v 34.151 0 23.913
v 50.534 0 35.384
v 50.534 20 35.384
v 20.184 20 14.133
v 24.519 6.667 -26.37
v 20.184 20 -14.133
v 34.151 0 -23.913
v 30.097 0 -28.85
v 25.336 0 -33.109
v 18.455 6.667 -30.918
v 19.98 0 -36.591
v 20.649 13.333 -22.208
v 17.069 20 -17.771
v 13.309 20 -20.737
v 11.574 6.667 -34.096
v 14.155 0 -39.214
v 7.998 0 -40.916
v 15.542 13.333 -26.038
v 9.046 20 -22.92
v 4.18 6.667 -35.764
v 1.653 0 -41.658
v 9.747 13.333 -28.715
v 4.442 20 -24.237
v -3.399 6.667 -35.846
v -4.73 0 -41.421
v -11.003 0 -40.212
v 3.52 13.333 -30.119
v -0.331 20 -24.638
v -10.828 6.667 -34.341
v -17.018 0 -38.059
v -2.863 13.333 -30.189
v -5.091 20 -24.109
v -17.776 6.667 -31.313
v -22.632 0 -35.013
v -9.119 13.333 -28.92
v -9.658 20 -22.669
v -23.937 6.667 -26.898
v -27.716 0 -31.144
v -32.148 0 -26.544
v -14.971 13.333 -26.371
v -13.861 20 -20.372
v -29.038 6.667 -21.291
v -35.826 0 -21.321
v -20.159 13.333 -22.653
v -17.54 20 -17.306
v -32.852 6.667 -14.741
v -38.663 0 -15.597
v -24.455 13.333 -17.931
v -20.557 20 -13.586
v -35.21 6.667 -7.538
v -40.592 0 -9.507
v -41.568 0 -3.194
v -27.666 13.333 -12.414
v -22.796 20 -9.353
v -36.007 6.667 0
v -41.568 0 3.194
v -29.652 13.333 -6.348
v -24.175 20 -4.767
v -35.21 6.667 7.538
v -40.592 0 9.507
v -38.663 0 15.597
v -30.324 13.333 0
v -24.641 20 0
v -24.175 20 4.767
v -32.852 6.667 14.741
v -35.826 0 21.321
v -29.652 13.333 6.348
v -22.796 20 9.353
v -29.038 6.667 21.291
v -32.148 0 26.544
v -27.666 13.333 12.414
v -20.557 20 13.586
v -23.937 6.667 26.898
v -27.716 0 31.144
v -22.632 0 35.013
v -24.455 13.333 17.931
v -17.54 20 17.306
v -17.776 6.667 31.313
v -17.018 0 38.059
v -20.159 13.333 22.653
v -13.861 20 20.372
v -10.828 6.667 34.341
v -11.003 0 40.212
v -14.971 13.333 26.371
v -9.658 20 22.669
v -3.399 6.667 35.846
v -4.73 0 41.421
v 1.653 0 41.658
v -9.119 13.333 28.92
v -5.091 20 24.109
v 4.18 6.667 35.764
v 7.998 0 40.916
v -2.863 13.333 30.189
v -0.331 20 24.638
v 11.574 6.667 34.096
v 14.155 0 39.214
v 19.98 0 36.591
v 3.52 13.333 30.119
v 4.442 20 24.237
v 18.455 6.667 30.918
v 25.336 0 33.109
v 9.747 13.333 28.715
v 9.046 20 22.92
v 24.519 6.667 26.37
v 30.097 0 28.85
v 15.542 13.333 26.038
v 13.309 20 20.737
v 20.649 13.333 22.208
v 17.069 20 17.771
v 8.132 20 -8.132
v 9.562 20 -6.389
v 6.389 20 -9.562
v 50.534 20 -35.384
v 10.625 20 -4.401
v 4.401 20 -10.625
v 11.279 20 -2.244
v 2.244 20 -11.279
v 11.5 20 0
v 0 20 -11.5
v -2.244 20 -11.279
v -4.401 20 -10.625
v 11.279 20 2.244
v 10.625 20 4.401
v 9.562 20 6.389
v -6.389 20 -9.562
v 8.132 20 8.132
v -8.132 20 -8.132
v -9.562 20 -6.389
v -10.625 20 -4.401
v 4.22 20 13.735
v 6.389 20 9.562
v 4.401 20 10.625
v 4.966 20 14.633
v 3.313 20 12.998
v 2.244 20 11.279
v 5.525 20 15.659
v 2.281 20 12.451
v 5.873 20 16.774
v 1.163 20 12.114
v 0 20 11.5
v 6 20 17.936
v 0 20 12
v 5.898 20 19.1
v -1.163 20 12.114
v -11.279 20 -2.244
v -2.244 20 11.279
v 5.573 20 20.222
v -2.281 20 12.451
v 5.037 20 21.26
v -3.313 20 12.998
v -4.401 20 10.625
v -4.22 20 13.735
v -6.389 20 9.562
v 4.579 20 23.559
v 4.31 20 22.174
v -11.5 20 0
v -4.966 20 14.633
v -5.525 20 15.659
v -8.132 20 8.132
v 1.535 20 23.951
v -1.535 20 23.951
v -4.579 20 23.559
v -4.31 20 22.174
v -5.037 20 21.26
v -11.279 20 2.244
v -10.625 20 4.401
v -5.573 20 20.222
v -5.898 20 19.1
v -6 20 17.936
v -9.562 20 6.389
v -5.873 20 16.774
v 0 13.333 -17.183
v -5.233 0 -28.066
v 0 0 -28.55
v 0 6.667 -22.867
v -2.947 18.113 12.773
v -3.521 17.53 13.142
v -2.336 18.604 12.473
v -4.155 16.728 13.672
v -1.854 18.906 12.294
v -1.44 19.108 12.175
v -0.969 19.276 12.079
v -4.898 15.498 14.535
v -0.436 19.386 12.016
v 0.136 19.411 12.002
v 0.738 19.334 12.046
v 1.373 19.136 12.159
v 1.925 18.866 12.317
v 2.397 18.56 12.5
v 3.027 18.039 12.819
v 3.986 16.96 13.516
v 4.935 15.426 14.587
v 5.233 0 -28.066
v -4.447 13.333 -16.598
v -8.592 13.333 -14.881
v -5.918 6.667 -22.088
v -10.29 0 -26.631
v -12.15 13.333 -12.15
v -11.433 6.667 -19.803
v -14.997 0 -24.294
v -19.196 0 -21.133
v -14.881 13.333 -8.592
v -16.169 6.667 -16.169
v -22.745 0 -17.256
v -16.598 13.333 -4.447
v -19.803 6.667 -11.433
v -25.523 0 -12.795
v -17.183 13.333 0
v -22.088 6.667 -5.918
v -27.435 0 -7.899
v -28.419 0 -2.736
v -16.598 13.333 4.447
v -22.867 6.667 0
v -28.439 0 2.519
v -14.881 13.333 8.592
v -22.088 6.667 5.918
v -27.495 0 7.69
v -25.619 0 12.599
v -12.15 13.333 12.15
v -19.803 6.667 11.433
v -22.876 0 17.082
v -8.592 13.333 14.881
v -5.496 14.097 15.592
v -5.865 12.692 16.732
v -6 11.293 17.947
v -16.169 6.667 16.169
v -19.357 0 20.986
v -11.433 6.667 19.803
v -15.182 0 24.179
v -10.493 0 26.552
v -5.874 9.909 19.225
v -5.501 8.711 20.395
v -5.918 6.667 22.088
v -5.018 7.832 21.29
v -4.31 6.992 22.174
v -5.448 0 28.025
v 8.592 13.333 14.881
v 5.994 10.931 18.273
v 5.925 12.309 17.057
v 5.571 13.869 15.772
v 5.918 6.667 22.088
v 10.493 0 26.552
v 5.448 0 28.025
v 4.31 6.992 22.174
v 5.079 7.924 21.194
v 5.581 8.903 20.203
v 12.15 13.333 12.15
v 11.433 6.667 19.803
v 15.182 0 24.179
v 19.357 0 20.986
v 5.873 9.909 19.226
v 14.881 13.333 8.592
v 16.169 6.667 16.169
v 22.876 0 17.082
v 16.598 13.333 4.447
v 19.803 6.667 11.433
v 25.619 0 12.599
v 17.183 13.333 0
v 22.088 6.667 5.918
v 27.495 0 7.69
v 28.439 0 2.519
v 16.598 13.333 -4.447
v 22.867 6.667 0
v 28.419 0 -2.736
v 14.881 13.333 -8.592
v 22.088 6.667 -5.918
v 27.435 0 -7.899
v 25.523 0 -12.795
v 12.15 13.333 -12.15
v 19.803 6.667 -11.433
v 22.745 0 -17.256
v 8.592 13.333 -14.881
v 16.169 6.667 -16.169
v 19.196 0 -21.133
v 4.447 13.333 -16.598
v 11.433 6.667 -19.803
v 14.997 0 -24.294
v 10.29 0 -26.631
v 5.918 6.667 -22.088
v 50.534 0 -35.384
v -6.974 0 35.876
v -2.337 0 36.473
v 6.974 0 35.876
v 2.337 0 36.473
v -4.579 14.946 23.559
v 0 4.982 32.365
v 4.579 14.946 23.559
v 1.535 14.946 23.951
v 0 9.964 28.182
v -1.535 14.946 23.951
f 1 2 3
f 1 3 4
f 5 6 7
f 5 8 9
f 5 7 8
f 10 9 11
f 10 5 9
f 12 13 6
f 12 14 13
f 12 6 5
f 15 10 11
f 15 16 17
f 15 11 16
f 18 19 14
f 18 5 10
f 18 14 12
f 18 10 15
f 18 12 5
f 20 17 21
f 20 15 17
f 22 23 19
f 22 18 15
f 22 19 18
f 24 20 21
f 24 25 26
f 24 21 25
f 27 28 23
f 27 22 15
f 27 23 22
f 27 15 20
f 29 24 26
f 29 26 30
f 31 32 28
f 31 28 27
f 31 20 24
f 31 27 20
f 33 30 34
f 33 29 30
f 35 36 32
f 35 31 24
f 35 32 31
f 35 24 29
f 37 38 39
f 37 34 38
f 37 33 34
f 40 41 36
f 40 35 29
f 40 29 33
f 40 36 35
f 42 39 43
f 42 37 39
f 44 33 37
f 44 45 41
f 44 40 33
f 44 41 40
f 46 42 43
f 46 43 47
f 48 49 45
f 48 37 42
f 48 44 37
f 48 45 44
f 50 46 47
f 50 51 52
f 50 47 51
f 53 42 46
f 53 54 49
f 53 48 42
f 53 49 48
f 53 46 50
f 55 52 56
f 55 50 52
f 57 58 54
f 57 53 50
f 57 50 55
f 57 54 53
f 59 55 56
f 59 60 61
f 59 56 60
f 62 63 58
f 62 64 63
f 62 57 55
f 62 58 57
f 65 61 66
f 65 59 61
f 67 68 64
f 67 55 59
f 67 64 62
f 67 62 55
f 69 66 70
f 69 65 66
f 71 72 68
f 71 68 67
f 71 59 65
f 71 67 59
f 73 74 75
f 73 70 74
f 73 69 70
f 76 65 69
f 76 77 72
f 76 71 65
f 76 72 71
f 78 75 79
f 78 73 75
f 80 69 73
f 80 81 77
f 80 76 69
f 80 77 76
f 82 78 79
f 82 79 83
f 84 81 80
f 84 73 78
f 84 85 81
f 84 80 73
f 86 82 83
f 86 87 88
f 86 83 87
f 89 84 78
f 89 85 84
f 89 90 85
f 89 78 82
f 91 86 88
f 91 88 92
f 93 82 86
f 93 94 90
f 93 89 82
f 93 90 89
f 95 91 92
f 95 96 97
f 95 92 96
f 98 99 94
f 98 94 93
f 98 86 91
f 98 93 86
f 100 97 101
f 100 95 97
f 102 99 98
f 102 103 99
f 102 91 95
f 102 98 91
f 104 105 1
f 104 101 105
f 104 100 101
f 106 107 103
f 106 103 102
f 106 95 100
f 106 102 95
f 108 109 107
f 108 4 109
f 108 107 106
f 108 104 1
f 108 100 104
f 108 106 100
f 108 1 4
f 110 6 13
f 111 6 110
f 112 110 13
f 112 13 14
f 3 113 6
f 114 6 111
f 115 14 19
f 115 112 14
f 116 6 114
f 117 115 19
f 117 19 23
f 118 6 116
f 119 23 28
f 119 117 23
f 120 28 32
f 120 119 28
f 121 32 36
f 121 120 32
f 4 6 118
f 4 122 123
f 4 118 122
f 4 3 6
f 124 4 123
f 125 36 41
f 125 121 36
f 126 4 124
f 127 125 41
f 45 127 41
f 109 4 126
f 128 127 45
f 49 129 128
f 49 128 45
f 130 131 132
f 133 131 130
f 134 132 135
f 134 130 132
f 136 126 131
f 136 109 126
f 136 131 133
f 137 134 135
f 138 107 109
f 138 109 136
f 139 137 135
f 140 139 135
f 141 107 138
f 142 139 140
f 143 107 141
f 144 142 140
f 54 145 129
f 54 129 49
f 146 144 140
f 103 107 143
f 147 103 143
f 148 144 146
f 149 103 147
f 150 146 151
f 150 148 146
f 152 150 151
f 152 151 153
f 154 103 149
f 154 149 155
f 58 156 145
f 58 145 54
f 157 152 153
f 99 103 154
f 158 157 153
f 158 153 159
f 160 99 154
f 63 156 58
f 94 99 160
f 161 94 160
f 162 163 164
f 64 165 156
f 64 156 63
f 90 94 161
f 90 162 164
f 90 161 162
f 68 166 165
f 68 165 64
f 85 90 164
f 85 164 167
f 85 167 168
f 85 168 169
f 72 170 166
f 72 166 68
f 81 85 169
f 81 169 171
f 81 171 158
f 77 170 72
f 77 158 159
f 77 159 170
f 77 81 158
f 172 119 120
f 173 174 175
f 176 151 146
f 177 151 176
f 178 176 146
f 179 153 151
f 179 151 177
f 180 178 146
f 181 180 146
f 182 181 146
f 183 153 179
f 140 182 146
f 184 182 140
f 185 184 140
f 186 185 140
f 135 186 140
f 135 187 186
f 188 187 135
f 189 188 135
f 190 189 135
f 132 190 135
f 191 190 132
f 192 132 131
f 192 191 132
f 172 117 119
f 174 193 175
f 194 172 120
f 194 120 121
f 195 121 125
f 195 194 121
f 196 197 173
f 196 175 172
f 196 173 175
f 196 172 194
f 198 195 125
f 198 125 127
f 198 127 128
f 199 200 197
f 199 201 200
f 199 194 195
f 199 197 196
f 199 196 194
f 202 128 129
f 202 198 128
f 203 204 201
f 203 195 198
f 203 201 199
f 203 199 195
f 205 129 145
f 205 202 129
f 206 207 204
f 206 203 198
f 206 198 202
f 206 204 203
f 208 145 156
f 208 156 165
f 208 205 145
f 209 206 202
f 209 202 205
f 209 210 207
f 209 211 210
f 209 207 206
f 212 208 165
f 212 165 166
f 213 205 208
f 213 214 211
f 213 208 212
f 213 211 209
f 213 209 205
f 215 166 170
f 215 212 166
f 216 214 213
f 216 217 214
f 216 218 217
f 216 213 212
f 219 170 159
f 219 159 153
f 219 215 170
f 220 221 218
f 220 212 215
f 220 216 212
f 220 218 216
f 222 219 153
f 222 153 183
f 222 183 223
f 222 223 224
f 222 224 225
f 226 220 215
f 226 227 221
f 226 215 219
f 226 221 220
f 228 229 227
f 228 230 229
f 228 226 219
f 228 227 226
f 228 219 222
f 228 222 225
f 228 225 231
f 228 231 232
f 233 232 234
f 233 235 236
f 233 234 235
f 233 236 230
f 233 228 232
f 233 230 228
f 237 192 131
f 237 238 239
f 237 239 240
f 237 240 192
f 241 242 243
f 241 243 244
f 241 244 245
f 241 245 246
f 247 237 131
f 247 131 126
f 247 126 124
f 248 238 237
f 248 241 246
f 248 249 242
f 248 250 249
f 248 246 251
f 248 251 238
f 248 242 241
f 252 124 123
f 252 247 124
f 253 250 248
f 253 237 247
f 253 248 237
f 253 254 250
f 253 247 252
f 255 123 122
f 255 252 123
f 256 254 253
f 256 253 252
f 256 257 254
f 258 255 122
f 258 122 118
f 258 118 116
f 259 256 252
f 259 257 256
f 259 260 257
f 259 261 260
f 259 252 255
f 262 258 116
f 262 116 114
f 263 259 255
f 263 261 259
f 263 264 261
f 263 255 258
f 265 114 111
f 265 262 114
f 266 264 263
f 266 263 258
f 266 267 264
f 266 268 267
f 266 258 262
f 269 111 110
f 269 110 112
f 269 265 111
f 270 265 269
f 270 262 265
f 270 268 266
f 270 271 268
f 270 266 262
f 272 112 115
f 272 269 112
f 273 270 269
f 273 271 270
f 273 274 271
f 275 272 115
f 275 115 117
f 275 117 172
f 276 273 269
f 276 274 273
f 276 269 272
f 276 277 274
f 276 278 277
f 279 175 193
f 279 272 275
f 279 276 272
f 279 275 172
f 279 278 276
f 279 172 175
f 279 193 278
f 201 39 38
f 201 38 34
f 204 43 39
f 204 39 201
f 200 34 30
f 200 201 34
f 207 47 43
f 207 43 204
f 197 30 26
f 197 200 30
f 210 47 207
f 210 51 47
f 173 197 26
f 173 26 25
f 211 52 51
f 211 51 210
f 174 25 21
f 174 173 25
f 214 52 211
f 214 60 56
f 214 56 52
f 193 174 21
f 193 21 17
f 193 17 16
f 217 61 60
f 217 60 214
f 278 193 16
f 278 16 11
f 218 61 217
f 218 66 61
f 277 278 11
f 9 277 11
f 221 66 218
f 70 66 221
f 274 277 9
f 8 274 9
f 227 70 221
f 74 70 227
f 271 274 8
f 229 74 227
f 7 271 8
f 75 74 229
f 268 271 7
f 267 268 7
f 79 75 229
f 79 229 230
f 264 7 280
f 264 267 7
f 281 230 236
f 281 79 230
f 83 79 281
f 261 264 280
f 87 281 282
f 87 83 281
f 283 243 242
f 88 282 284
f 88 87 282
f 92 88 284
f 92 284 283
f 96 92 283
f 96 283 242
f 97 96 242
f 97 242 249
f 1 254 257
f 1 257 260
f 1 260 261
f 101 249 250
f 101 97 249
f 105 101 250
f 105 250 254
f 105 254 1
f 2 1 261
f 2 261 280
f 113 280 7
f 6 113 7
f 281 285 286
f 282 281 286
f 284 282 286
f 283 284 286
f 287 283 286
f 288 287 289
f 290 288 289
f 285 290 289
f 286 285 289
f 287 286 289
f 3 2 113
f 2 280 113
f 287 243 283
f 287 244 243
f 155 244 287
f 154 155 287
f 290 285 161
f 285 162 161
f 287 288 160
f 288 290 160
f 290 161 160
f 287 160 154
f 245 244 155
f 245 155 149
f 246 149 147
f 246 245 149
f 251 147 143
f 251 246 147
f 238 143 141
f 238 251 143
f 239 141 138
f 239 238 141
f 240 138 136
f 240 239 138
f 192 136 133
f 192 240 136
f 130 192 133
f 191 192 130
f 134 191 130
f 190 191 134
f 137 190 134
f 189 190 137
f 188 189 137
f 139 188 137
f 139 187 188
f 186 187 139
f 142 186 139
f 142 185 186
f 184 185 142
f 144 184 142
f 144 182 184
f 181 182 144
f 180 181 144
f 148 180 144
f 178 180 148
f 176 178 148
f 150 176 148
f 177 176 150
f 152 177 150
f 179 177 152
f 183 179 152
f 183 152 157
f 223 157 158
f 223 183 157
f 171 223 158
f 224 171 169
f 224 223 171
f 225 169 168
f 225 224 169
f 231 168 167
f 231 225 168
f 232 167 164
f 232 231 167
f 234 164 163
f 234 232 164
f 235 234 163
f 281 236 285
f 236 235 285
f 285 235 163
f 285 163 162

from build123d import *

# Parameters (mm, degrees)
REVOLVE2_ANGLE          = 70
CUT_EXTRUDE1_DEPTH      = 78.096292231
CUT_EXTRUDE1_DEPTH_BACK = 78.096292231
SKETCH4_W               = 54.680091263
SKETCH4_H               = 66.719762054
SKETCH5_R               = 6
CUT_EXTRUDE2_DEPTH      = 40
CUT_REVOLVE1_ANGLE      = 22


with BuildPart() as part:
    # Sketch1 → Revolve1 (revolve)
    with BuildSketch(Plane(origin=(0, 0, 0), x_dir=(0, 0, -1), z_dir=(1, 0, 0))):
        Polygon((11.5, 20), (28.55, 0), (41.690609765, 0), (24.640609765, 20), align=None)
    revolve(axis=Axis((0, 0, 0), (0, 1, 0)))

    # Sketch3 → Revolve2 (revolve, symmetric)
    with BuildSketch(Plane.XY) as revolve2_sk:
        Polygon((24.640609765, 20), (61.690609765, 20), (61.690609765, 0), (41.690609765, 0), align=None)
    revolve(axis=Axis((0, 0, 0), (0, 1, 0)), revolution_arc=REVOLVE2_ANGLE / 2)
    revolve(revolve2_sk.sketch, axis=Axis((0, 0, 0), (0, -1, 0)), revolution_arc=REVOLVE2_ANGLE / 2)

    # Sketch4 → Cut-Extrude1 (cut, two sides: drawn at the far end of the back side and taken through both)
    with BuildSketch(Plane.XY.offset(-CUT_EXTRUDE1_DEPTH_BACK)):
        with Locations((77.874034735, 12.769248077)):
            Rectangle(SKETCH4_W, SKETCH4_H)
    extrude(amount=CUT_EXTRUDE1_DEPTH + CUT_EXTRUDE1_DEPTH_BACK, mode=Mode.SUBTRACT)

    # Sketch5 → Cut-Extrude2 (cut)
    with BuildSketch(Plane(origin=(0, 0, 0), x_dir=(1, 0, 0), z_dir=(0, 1, 0))):
        with Locations(Location((0, -18, 0), (0, 0, 251.911143057))):
            Circle(SKETCH5_R)
    extrude(amount=CUT_EXTRUDE2_DEPTH, mode=Mode.SUBTRACT)

    # Sketch7 → Cut-Revolve1 (revolve, symmetric, cut)
    with BuildSketch(Plane(origin=(0, 0, 0), x_dir=(0, 0, -1), z_dir=(1, 0, 0))) as cut_revolve1_sk:
        Polygon((-43.736107379, -8.562897575), (-24, 14.94597317), (-24, 20), (-18.43156125, 20), (-18.70488034, 12.563709667), (-17.388176204, -8.562897575), align=None)
    revolve(axis=Axis((0, 0, 0), (0, 1, 0)), revolution_arc=CUT_REVOLVE1_ANGLE / 2, mode=Mode.SUBTRACT)
    revolve(cut_revolve1_sk.sketch, axis=Axis((0, 0, 0), (0, -1, 0)), revolution_arc=CUT_REVOLVE1_ANGLE / 2, mode=Mode.SUBTRACT)


solid = part.part
